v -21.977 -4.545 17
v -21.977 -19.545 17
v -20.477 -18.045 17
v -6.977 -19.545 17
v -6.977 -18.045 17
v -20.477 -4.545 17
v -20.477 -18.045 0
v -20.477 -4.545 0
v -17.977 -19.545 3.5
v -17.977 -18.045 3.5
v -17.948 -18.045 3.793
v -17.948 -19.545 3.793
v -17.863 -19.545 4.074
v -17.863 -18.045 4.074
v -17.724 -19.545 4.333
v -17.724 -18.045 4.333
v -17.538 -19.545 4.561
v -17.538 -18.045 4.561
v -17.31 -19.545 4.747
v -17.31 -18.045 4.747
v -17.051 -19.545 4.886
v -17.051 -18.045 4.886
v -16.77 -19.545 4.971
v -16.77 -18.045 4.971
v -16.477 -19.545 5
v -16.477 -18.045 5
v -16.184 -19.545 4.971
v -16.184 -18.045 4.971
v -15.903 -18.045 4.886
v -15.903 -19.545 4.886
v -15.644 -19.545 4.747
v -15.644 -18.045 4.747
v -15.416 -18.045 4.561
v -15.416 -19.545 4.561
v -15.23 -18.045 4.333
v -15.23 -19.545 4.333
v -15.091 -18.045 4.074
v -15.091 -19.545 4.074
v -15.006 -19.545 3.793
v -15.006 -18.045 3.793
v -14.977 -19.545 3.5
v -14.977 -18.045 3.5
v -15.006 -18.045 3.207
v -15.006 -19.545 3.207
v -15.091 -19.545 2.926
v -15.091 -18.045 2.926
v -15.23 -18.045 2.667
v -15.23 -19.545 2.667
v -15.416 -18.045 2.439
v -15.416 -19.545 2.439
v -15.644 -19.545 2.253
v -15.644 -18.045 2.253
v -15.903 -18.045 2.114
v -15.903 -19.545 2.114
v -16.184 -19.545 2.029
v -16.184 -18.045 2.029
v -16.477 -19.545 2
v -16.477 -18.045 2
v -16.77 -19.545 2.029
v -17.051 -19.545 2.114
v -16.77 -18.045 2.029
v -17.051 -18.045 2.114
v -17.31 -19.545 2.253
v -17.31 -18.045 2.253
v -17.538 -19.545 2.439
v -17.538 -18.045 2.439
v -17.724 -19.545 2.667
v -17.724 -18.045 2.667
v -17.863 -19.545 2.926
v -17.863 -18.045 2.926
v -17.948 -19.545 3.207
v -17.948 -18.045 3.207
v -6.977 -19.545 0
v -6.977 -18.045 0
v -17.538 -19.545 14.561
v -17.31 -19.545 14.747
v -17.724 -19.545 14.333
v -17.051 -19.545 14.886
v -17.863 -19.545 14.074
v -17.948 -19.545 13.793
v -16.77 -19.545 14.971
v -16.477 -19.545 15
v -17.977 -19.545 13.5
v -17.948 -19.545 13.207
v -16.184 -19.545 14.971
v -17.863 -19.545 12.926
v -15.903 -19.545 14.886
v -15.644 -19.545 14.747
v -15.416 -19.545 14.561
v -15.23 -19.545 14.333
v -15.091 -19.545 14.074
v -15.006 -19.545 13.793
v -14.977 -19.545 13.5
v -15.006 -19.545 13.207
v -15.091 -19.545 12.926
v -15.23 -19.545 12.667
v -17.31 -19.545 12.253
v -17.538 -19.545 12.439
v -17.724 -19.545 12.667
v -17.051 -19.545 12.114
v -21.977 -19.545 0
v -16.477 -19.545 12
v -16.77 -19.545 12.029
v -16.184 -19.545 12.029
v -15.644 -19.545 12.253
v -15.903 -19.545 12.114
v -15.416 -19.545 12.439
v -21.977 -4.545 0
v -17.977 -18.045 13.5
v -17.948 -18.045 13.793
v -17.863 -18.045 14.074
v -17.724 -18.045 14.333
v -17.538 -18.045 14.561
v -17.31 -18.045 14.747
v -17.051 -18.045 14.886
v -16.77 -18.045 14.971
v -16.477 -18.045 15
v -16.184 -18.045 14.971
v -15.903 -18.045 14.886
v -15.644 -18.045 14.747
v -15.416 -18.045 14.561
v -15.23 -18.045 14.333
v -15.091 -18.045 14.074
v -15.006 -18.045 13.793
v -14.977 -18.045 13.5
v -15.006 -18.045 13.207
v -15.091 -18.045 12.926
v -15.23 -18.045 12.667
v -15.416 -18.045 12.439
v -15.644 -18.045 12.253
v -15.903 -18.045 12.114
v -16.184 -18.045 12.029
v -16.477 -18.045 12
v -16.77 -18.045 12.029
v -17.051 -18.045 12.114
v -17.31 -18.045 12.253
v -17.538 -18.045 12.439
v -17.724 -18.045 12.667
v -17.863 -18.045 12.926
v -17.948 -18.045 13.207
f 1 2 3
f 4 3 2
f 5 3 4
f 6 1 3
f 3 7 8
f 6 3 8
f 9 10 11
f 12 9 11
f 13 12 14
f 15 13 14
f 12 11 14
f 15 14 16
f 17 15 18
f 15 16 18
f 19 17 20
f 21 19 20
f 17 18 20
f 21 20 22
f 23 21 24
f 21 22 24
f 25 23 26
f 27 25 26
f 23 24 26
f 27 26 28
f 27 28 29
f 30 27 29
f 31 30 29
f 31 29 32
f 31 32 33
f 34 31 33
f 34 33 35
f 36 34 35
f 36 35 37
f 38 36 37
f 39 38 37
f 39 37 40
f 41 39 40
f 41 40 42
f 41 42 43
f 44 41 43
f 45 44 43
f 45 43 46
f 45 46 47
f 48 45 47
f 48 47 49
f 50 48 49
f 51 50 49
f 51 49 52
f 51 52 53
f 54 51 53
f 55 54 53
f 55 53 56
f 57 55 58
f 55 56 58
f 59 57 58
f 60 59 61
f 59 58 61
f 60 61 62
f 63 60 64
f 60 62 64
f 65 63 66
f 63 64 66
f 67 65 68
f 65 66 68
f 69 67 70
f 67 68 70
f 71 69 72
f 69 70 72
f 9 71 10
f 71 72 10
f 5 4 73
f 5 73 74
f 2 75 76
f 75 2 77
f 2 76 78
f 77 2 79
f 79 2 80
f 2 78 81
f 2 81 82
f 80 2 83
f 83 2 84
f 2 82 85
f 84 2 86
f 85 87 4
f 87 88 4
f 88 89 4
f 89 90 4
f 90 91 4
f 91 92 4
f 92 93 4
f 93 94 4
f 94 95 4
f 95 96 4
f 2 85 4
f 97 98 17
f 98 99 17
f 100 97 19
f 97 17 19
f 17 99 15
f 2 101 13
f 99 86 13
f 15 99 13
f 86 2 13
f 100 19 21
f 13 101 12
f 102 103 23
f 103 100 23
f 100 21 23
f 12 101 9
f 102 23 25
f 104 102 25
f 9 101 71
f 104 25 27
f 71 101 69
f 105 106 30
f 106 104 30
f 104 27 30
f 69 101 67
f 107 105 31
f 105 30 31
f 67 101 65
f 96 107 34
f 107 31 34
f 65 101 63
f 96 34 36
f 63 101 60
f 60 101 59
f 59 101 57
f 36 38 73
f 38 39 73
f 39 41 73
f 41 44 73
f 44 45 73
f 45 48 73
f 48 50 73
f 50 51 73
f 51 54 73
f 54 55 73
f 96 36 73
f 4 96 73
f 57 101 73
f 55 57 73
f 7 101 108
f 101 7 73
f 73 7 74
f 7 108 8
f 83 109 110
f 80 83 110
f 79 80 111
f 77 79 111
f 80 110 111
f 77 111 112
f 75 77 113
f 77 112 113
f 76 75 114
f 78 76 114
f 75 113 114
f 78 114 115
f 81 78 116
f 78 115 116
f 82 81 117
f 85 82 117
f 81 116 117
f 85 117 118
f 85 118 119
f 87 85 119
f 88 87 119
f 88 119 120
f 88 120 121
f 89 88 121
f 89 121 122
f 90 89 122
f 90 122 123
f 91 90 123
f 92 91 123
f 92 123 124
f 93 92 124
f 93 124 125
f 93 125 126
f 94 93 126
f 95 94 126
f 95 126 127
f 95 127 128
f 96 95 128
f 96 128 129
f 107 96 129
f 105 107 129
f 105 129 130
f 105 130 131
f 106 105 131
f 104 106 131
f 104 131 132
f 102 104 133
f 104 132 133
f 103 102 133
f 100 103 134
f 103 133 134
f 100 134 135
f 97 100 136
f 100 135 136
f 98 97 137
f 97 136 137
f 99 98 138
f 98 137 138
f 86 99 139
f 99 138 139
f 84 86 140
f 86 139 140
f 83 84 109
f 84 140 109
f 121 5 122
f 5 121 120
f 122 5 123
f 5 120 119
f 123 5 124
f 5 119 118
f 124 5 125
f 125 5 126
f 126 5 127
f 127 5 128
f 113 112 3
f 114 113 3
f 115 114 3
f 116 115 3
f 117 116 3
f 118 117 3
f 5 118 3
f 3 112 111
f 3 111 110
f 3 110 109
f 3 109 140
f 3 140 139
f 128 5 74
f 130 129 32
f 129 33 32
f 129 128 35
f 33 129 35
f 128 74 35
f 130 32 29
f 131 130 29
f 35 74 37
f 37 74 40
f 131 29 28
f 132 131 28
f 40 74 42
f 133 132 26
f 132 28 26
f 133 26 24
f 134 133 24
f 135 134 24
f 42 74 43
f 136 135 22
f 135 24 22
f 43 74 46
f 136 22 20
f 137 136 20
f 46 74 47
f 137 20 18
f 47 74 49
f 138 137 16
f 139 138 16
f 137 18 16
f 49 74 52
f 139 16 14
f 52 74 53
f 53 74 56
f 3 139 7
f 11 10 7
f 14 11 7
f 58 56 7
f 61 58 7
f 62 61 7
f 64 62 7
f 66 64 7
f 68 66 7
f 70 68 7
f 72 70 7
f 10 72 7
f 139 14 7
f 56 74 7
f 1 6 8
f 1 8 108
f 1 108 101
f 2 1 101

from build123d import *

# Parameters (mm, degrees)
EXTRUSION1_DEPTH = 17
ESQUISSE2_R      = 1.5
EXTRUSION2_DEPTH = 15


with BuildPart() as part:
    # Esquisse1 → Extrusion1 (new body)
    with BuildSketch(Plane.XY):
        Polygon((-21.976949538, -4.544631579), (-21.976949538, -19.544631579), (-6.976949538, -19.544631579), (-6.976949538, -18.044631579), (-20.476949538, -18.044631579), (-20.476949538, -4.544631579), align=None)
    extrude(amount=EXTRUSION1_DEPTH)

    # Esquisse2 → Extrusion2 (cut)
    with BuildSketch(Plane(origin=(0, -18.044631579, 0), x_dir=(1, 0, 0), z_dir=(0, 1, 0))):
        with Locations(Location((-16.476949538, -13.5, 0), (0, 0, 180))):
            Circle(ESQUISSE2_R)
        with Locations(Location((-16.476949538, -3.5, 0), (0, 0, 180))):
            Circle(ESQUISSE2_R)
    extrude(amount=-EXTRUSION2_DEPTH, mode=Mode.SUBTRACT)


solid = part.part
